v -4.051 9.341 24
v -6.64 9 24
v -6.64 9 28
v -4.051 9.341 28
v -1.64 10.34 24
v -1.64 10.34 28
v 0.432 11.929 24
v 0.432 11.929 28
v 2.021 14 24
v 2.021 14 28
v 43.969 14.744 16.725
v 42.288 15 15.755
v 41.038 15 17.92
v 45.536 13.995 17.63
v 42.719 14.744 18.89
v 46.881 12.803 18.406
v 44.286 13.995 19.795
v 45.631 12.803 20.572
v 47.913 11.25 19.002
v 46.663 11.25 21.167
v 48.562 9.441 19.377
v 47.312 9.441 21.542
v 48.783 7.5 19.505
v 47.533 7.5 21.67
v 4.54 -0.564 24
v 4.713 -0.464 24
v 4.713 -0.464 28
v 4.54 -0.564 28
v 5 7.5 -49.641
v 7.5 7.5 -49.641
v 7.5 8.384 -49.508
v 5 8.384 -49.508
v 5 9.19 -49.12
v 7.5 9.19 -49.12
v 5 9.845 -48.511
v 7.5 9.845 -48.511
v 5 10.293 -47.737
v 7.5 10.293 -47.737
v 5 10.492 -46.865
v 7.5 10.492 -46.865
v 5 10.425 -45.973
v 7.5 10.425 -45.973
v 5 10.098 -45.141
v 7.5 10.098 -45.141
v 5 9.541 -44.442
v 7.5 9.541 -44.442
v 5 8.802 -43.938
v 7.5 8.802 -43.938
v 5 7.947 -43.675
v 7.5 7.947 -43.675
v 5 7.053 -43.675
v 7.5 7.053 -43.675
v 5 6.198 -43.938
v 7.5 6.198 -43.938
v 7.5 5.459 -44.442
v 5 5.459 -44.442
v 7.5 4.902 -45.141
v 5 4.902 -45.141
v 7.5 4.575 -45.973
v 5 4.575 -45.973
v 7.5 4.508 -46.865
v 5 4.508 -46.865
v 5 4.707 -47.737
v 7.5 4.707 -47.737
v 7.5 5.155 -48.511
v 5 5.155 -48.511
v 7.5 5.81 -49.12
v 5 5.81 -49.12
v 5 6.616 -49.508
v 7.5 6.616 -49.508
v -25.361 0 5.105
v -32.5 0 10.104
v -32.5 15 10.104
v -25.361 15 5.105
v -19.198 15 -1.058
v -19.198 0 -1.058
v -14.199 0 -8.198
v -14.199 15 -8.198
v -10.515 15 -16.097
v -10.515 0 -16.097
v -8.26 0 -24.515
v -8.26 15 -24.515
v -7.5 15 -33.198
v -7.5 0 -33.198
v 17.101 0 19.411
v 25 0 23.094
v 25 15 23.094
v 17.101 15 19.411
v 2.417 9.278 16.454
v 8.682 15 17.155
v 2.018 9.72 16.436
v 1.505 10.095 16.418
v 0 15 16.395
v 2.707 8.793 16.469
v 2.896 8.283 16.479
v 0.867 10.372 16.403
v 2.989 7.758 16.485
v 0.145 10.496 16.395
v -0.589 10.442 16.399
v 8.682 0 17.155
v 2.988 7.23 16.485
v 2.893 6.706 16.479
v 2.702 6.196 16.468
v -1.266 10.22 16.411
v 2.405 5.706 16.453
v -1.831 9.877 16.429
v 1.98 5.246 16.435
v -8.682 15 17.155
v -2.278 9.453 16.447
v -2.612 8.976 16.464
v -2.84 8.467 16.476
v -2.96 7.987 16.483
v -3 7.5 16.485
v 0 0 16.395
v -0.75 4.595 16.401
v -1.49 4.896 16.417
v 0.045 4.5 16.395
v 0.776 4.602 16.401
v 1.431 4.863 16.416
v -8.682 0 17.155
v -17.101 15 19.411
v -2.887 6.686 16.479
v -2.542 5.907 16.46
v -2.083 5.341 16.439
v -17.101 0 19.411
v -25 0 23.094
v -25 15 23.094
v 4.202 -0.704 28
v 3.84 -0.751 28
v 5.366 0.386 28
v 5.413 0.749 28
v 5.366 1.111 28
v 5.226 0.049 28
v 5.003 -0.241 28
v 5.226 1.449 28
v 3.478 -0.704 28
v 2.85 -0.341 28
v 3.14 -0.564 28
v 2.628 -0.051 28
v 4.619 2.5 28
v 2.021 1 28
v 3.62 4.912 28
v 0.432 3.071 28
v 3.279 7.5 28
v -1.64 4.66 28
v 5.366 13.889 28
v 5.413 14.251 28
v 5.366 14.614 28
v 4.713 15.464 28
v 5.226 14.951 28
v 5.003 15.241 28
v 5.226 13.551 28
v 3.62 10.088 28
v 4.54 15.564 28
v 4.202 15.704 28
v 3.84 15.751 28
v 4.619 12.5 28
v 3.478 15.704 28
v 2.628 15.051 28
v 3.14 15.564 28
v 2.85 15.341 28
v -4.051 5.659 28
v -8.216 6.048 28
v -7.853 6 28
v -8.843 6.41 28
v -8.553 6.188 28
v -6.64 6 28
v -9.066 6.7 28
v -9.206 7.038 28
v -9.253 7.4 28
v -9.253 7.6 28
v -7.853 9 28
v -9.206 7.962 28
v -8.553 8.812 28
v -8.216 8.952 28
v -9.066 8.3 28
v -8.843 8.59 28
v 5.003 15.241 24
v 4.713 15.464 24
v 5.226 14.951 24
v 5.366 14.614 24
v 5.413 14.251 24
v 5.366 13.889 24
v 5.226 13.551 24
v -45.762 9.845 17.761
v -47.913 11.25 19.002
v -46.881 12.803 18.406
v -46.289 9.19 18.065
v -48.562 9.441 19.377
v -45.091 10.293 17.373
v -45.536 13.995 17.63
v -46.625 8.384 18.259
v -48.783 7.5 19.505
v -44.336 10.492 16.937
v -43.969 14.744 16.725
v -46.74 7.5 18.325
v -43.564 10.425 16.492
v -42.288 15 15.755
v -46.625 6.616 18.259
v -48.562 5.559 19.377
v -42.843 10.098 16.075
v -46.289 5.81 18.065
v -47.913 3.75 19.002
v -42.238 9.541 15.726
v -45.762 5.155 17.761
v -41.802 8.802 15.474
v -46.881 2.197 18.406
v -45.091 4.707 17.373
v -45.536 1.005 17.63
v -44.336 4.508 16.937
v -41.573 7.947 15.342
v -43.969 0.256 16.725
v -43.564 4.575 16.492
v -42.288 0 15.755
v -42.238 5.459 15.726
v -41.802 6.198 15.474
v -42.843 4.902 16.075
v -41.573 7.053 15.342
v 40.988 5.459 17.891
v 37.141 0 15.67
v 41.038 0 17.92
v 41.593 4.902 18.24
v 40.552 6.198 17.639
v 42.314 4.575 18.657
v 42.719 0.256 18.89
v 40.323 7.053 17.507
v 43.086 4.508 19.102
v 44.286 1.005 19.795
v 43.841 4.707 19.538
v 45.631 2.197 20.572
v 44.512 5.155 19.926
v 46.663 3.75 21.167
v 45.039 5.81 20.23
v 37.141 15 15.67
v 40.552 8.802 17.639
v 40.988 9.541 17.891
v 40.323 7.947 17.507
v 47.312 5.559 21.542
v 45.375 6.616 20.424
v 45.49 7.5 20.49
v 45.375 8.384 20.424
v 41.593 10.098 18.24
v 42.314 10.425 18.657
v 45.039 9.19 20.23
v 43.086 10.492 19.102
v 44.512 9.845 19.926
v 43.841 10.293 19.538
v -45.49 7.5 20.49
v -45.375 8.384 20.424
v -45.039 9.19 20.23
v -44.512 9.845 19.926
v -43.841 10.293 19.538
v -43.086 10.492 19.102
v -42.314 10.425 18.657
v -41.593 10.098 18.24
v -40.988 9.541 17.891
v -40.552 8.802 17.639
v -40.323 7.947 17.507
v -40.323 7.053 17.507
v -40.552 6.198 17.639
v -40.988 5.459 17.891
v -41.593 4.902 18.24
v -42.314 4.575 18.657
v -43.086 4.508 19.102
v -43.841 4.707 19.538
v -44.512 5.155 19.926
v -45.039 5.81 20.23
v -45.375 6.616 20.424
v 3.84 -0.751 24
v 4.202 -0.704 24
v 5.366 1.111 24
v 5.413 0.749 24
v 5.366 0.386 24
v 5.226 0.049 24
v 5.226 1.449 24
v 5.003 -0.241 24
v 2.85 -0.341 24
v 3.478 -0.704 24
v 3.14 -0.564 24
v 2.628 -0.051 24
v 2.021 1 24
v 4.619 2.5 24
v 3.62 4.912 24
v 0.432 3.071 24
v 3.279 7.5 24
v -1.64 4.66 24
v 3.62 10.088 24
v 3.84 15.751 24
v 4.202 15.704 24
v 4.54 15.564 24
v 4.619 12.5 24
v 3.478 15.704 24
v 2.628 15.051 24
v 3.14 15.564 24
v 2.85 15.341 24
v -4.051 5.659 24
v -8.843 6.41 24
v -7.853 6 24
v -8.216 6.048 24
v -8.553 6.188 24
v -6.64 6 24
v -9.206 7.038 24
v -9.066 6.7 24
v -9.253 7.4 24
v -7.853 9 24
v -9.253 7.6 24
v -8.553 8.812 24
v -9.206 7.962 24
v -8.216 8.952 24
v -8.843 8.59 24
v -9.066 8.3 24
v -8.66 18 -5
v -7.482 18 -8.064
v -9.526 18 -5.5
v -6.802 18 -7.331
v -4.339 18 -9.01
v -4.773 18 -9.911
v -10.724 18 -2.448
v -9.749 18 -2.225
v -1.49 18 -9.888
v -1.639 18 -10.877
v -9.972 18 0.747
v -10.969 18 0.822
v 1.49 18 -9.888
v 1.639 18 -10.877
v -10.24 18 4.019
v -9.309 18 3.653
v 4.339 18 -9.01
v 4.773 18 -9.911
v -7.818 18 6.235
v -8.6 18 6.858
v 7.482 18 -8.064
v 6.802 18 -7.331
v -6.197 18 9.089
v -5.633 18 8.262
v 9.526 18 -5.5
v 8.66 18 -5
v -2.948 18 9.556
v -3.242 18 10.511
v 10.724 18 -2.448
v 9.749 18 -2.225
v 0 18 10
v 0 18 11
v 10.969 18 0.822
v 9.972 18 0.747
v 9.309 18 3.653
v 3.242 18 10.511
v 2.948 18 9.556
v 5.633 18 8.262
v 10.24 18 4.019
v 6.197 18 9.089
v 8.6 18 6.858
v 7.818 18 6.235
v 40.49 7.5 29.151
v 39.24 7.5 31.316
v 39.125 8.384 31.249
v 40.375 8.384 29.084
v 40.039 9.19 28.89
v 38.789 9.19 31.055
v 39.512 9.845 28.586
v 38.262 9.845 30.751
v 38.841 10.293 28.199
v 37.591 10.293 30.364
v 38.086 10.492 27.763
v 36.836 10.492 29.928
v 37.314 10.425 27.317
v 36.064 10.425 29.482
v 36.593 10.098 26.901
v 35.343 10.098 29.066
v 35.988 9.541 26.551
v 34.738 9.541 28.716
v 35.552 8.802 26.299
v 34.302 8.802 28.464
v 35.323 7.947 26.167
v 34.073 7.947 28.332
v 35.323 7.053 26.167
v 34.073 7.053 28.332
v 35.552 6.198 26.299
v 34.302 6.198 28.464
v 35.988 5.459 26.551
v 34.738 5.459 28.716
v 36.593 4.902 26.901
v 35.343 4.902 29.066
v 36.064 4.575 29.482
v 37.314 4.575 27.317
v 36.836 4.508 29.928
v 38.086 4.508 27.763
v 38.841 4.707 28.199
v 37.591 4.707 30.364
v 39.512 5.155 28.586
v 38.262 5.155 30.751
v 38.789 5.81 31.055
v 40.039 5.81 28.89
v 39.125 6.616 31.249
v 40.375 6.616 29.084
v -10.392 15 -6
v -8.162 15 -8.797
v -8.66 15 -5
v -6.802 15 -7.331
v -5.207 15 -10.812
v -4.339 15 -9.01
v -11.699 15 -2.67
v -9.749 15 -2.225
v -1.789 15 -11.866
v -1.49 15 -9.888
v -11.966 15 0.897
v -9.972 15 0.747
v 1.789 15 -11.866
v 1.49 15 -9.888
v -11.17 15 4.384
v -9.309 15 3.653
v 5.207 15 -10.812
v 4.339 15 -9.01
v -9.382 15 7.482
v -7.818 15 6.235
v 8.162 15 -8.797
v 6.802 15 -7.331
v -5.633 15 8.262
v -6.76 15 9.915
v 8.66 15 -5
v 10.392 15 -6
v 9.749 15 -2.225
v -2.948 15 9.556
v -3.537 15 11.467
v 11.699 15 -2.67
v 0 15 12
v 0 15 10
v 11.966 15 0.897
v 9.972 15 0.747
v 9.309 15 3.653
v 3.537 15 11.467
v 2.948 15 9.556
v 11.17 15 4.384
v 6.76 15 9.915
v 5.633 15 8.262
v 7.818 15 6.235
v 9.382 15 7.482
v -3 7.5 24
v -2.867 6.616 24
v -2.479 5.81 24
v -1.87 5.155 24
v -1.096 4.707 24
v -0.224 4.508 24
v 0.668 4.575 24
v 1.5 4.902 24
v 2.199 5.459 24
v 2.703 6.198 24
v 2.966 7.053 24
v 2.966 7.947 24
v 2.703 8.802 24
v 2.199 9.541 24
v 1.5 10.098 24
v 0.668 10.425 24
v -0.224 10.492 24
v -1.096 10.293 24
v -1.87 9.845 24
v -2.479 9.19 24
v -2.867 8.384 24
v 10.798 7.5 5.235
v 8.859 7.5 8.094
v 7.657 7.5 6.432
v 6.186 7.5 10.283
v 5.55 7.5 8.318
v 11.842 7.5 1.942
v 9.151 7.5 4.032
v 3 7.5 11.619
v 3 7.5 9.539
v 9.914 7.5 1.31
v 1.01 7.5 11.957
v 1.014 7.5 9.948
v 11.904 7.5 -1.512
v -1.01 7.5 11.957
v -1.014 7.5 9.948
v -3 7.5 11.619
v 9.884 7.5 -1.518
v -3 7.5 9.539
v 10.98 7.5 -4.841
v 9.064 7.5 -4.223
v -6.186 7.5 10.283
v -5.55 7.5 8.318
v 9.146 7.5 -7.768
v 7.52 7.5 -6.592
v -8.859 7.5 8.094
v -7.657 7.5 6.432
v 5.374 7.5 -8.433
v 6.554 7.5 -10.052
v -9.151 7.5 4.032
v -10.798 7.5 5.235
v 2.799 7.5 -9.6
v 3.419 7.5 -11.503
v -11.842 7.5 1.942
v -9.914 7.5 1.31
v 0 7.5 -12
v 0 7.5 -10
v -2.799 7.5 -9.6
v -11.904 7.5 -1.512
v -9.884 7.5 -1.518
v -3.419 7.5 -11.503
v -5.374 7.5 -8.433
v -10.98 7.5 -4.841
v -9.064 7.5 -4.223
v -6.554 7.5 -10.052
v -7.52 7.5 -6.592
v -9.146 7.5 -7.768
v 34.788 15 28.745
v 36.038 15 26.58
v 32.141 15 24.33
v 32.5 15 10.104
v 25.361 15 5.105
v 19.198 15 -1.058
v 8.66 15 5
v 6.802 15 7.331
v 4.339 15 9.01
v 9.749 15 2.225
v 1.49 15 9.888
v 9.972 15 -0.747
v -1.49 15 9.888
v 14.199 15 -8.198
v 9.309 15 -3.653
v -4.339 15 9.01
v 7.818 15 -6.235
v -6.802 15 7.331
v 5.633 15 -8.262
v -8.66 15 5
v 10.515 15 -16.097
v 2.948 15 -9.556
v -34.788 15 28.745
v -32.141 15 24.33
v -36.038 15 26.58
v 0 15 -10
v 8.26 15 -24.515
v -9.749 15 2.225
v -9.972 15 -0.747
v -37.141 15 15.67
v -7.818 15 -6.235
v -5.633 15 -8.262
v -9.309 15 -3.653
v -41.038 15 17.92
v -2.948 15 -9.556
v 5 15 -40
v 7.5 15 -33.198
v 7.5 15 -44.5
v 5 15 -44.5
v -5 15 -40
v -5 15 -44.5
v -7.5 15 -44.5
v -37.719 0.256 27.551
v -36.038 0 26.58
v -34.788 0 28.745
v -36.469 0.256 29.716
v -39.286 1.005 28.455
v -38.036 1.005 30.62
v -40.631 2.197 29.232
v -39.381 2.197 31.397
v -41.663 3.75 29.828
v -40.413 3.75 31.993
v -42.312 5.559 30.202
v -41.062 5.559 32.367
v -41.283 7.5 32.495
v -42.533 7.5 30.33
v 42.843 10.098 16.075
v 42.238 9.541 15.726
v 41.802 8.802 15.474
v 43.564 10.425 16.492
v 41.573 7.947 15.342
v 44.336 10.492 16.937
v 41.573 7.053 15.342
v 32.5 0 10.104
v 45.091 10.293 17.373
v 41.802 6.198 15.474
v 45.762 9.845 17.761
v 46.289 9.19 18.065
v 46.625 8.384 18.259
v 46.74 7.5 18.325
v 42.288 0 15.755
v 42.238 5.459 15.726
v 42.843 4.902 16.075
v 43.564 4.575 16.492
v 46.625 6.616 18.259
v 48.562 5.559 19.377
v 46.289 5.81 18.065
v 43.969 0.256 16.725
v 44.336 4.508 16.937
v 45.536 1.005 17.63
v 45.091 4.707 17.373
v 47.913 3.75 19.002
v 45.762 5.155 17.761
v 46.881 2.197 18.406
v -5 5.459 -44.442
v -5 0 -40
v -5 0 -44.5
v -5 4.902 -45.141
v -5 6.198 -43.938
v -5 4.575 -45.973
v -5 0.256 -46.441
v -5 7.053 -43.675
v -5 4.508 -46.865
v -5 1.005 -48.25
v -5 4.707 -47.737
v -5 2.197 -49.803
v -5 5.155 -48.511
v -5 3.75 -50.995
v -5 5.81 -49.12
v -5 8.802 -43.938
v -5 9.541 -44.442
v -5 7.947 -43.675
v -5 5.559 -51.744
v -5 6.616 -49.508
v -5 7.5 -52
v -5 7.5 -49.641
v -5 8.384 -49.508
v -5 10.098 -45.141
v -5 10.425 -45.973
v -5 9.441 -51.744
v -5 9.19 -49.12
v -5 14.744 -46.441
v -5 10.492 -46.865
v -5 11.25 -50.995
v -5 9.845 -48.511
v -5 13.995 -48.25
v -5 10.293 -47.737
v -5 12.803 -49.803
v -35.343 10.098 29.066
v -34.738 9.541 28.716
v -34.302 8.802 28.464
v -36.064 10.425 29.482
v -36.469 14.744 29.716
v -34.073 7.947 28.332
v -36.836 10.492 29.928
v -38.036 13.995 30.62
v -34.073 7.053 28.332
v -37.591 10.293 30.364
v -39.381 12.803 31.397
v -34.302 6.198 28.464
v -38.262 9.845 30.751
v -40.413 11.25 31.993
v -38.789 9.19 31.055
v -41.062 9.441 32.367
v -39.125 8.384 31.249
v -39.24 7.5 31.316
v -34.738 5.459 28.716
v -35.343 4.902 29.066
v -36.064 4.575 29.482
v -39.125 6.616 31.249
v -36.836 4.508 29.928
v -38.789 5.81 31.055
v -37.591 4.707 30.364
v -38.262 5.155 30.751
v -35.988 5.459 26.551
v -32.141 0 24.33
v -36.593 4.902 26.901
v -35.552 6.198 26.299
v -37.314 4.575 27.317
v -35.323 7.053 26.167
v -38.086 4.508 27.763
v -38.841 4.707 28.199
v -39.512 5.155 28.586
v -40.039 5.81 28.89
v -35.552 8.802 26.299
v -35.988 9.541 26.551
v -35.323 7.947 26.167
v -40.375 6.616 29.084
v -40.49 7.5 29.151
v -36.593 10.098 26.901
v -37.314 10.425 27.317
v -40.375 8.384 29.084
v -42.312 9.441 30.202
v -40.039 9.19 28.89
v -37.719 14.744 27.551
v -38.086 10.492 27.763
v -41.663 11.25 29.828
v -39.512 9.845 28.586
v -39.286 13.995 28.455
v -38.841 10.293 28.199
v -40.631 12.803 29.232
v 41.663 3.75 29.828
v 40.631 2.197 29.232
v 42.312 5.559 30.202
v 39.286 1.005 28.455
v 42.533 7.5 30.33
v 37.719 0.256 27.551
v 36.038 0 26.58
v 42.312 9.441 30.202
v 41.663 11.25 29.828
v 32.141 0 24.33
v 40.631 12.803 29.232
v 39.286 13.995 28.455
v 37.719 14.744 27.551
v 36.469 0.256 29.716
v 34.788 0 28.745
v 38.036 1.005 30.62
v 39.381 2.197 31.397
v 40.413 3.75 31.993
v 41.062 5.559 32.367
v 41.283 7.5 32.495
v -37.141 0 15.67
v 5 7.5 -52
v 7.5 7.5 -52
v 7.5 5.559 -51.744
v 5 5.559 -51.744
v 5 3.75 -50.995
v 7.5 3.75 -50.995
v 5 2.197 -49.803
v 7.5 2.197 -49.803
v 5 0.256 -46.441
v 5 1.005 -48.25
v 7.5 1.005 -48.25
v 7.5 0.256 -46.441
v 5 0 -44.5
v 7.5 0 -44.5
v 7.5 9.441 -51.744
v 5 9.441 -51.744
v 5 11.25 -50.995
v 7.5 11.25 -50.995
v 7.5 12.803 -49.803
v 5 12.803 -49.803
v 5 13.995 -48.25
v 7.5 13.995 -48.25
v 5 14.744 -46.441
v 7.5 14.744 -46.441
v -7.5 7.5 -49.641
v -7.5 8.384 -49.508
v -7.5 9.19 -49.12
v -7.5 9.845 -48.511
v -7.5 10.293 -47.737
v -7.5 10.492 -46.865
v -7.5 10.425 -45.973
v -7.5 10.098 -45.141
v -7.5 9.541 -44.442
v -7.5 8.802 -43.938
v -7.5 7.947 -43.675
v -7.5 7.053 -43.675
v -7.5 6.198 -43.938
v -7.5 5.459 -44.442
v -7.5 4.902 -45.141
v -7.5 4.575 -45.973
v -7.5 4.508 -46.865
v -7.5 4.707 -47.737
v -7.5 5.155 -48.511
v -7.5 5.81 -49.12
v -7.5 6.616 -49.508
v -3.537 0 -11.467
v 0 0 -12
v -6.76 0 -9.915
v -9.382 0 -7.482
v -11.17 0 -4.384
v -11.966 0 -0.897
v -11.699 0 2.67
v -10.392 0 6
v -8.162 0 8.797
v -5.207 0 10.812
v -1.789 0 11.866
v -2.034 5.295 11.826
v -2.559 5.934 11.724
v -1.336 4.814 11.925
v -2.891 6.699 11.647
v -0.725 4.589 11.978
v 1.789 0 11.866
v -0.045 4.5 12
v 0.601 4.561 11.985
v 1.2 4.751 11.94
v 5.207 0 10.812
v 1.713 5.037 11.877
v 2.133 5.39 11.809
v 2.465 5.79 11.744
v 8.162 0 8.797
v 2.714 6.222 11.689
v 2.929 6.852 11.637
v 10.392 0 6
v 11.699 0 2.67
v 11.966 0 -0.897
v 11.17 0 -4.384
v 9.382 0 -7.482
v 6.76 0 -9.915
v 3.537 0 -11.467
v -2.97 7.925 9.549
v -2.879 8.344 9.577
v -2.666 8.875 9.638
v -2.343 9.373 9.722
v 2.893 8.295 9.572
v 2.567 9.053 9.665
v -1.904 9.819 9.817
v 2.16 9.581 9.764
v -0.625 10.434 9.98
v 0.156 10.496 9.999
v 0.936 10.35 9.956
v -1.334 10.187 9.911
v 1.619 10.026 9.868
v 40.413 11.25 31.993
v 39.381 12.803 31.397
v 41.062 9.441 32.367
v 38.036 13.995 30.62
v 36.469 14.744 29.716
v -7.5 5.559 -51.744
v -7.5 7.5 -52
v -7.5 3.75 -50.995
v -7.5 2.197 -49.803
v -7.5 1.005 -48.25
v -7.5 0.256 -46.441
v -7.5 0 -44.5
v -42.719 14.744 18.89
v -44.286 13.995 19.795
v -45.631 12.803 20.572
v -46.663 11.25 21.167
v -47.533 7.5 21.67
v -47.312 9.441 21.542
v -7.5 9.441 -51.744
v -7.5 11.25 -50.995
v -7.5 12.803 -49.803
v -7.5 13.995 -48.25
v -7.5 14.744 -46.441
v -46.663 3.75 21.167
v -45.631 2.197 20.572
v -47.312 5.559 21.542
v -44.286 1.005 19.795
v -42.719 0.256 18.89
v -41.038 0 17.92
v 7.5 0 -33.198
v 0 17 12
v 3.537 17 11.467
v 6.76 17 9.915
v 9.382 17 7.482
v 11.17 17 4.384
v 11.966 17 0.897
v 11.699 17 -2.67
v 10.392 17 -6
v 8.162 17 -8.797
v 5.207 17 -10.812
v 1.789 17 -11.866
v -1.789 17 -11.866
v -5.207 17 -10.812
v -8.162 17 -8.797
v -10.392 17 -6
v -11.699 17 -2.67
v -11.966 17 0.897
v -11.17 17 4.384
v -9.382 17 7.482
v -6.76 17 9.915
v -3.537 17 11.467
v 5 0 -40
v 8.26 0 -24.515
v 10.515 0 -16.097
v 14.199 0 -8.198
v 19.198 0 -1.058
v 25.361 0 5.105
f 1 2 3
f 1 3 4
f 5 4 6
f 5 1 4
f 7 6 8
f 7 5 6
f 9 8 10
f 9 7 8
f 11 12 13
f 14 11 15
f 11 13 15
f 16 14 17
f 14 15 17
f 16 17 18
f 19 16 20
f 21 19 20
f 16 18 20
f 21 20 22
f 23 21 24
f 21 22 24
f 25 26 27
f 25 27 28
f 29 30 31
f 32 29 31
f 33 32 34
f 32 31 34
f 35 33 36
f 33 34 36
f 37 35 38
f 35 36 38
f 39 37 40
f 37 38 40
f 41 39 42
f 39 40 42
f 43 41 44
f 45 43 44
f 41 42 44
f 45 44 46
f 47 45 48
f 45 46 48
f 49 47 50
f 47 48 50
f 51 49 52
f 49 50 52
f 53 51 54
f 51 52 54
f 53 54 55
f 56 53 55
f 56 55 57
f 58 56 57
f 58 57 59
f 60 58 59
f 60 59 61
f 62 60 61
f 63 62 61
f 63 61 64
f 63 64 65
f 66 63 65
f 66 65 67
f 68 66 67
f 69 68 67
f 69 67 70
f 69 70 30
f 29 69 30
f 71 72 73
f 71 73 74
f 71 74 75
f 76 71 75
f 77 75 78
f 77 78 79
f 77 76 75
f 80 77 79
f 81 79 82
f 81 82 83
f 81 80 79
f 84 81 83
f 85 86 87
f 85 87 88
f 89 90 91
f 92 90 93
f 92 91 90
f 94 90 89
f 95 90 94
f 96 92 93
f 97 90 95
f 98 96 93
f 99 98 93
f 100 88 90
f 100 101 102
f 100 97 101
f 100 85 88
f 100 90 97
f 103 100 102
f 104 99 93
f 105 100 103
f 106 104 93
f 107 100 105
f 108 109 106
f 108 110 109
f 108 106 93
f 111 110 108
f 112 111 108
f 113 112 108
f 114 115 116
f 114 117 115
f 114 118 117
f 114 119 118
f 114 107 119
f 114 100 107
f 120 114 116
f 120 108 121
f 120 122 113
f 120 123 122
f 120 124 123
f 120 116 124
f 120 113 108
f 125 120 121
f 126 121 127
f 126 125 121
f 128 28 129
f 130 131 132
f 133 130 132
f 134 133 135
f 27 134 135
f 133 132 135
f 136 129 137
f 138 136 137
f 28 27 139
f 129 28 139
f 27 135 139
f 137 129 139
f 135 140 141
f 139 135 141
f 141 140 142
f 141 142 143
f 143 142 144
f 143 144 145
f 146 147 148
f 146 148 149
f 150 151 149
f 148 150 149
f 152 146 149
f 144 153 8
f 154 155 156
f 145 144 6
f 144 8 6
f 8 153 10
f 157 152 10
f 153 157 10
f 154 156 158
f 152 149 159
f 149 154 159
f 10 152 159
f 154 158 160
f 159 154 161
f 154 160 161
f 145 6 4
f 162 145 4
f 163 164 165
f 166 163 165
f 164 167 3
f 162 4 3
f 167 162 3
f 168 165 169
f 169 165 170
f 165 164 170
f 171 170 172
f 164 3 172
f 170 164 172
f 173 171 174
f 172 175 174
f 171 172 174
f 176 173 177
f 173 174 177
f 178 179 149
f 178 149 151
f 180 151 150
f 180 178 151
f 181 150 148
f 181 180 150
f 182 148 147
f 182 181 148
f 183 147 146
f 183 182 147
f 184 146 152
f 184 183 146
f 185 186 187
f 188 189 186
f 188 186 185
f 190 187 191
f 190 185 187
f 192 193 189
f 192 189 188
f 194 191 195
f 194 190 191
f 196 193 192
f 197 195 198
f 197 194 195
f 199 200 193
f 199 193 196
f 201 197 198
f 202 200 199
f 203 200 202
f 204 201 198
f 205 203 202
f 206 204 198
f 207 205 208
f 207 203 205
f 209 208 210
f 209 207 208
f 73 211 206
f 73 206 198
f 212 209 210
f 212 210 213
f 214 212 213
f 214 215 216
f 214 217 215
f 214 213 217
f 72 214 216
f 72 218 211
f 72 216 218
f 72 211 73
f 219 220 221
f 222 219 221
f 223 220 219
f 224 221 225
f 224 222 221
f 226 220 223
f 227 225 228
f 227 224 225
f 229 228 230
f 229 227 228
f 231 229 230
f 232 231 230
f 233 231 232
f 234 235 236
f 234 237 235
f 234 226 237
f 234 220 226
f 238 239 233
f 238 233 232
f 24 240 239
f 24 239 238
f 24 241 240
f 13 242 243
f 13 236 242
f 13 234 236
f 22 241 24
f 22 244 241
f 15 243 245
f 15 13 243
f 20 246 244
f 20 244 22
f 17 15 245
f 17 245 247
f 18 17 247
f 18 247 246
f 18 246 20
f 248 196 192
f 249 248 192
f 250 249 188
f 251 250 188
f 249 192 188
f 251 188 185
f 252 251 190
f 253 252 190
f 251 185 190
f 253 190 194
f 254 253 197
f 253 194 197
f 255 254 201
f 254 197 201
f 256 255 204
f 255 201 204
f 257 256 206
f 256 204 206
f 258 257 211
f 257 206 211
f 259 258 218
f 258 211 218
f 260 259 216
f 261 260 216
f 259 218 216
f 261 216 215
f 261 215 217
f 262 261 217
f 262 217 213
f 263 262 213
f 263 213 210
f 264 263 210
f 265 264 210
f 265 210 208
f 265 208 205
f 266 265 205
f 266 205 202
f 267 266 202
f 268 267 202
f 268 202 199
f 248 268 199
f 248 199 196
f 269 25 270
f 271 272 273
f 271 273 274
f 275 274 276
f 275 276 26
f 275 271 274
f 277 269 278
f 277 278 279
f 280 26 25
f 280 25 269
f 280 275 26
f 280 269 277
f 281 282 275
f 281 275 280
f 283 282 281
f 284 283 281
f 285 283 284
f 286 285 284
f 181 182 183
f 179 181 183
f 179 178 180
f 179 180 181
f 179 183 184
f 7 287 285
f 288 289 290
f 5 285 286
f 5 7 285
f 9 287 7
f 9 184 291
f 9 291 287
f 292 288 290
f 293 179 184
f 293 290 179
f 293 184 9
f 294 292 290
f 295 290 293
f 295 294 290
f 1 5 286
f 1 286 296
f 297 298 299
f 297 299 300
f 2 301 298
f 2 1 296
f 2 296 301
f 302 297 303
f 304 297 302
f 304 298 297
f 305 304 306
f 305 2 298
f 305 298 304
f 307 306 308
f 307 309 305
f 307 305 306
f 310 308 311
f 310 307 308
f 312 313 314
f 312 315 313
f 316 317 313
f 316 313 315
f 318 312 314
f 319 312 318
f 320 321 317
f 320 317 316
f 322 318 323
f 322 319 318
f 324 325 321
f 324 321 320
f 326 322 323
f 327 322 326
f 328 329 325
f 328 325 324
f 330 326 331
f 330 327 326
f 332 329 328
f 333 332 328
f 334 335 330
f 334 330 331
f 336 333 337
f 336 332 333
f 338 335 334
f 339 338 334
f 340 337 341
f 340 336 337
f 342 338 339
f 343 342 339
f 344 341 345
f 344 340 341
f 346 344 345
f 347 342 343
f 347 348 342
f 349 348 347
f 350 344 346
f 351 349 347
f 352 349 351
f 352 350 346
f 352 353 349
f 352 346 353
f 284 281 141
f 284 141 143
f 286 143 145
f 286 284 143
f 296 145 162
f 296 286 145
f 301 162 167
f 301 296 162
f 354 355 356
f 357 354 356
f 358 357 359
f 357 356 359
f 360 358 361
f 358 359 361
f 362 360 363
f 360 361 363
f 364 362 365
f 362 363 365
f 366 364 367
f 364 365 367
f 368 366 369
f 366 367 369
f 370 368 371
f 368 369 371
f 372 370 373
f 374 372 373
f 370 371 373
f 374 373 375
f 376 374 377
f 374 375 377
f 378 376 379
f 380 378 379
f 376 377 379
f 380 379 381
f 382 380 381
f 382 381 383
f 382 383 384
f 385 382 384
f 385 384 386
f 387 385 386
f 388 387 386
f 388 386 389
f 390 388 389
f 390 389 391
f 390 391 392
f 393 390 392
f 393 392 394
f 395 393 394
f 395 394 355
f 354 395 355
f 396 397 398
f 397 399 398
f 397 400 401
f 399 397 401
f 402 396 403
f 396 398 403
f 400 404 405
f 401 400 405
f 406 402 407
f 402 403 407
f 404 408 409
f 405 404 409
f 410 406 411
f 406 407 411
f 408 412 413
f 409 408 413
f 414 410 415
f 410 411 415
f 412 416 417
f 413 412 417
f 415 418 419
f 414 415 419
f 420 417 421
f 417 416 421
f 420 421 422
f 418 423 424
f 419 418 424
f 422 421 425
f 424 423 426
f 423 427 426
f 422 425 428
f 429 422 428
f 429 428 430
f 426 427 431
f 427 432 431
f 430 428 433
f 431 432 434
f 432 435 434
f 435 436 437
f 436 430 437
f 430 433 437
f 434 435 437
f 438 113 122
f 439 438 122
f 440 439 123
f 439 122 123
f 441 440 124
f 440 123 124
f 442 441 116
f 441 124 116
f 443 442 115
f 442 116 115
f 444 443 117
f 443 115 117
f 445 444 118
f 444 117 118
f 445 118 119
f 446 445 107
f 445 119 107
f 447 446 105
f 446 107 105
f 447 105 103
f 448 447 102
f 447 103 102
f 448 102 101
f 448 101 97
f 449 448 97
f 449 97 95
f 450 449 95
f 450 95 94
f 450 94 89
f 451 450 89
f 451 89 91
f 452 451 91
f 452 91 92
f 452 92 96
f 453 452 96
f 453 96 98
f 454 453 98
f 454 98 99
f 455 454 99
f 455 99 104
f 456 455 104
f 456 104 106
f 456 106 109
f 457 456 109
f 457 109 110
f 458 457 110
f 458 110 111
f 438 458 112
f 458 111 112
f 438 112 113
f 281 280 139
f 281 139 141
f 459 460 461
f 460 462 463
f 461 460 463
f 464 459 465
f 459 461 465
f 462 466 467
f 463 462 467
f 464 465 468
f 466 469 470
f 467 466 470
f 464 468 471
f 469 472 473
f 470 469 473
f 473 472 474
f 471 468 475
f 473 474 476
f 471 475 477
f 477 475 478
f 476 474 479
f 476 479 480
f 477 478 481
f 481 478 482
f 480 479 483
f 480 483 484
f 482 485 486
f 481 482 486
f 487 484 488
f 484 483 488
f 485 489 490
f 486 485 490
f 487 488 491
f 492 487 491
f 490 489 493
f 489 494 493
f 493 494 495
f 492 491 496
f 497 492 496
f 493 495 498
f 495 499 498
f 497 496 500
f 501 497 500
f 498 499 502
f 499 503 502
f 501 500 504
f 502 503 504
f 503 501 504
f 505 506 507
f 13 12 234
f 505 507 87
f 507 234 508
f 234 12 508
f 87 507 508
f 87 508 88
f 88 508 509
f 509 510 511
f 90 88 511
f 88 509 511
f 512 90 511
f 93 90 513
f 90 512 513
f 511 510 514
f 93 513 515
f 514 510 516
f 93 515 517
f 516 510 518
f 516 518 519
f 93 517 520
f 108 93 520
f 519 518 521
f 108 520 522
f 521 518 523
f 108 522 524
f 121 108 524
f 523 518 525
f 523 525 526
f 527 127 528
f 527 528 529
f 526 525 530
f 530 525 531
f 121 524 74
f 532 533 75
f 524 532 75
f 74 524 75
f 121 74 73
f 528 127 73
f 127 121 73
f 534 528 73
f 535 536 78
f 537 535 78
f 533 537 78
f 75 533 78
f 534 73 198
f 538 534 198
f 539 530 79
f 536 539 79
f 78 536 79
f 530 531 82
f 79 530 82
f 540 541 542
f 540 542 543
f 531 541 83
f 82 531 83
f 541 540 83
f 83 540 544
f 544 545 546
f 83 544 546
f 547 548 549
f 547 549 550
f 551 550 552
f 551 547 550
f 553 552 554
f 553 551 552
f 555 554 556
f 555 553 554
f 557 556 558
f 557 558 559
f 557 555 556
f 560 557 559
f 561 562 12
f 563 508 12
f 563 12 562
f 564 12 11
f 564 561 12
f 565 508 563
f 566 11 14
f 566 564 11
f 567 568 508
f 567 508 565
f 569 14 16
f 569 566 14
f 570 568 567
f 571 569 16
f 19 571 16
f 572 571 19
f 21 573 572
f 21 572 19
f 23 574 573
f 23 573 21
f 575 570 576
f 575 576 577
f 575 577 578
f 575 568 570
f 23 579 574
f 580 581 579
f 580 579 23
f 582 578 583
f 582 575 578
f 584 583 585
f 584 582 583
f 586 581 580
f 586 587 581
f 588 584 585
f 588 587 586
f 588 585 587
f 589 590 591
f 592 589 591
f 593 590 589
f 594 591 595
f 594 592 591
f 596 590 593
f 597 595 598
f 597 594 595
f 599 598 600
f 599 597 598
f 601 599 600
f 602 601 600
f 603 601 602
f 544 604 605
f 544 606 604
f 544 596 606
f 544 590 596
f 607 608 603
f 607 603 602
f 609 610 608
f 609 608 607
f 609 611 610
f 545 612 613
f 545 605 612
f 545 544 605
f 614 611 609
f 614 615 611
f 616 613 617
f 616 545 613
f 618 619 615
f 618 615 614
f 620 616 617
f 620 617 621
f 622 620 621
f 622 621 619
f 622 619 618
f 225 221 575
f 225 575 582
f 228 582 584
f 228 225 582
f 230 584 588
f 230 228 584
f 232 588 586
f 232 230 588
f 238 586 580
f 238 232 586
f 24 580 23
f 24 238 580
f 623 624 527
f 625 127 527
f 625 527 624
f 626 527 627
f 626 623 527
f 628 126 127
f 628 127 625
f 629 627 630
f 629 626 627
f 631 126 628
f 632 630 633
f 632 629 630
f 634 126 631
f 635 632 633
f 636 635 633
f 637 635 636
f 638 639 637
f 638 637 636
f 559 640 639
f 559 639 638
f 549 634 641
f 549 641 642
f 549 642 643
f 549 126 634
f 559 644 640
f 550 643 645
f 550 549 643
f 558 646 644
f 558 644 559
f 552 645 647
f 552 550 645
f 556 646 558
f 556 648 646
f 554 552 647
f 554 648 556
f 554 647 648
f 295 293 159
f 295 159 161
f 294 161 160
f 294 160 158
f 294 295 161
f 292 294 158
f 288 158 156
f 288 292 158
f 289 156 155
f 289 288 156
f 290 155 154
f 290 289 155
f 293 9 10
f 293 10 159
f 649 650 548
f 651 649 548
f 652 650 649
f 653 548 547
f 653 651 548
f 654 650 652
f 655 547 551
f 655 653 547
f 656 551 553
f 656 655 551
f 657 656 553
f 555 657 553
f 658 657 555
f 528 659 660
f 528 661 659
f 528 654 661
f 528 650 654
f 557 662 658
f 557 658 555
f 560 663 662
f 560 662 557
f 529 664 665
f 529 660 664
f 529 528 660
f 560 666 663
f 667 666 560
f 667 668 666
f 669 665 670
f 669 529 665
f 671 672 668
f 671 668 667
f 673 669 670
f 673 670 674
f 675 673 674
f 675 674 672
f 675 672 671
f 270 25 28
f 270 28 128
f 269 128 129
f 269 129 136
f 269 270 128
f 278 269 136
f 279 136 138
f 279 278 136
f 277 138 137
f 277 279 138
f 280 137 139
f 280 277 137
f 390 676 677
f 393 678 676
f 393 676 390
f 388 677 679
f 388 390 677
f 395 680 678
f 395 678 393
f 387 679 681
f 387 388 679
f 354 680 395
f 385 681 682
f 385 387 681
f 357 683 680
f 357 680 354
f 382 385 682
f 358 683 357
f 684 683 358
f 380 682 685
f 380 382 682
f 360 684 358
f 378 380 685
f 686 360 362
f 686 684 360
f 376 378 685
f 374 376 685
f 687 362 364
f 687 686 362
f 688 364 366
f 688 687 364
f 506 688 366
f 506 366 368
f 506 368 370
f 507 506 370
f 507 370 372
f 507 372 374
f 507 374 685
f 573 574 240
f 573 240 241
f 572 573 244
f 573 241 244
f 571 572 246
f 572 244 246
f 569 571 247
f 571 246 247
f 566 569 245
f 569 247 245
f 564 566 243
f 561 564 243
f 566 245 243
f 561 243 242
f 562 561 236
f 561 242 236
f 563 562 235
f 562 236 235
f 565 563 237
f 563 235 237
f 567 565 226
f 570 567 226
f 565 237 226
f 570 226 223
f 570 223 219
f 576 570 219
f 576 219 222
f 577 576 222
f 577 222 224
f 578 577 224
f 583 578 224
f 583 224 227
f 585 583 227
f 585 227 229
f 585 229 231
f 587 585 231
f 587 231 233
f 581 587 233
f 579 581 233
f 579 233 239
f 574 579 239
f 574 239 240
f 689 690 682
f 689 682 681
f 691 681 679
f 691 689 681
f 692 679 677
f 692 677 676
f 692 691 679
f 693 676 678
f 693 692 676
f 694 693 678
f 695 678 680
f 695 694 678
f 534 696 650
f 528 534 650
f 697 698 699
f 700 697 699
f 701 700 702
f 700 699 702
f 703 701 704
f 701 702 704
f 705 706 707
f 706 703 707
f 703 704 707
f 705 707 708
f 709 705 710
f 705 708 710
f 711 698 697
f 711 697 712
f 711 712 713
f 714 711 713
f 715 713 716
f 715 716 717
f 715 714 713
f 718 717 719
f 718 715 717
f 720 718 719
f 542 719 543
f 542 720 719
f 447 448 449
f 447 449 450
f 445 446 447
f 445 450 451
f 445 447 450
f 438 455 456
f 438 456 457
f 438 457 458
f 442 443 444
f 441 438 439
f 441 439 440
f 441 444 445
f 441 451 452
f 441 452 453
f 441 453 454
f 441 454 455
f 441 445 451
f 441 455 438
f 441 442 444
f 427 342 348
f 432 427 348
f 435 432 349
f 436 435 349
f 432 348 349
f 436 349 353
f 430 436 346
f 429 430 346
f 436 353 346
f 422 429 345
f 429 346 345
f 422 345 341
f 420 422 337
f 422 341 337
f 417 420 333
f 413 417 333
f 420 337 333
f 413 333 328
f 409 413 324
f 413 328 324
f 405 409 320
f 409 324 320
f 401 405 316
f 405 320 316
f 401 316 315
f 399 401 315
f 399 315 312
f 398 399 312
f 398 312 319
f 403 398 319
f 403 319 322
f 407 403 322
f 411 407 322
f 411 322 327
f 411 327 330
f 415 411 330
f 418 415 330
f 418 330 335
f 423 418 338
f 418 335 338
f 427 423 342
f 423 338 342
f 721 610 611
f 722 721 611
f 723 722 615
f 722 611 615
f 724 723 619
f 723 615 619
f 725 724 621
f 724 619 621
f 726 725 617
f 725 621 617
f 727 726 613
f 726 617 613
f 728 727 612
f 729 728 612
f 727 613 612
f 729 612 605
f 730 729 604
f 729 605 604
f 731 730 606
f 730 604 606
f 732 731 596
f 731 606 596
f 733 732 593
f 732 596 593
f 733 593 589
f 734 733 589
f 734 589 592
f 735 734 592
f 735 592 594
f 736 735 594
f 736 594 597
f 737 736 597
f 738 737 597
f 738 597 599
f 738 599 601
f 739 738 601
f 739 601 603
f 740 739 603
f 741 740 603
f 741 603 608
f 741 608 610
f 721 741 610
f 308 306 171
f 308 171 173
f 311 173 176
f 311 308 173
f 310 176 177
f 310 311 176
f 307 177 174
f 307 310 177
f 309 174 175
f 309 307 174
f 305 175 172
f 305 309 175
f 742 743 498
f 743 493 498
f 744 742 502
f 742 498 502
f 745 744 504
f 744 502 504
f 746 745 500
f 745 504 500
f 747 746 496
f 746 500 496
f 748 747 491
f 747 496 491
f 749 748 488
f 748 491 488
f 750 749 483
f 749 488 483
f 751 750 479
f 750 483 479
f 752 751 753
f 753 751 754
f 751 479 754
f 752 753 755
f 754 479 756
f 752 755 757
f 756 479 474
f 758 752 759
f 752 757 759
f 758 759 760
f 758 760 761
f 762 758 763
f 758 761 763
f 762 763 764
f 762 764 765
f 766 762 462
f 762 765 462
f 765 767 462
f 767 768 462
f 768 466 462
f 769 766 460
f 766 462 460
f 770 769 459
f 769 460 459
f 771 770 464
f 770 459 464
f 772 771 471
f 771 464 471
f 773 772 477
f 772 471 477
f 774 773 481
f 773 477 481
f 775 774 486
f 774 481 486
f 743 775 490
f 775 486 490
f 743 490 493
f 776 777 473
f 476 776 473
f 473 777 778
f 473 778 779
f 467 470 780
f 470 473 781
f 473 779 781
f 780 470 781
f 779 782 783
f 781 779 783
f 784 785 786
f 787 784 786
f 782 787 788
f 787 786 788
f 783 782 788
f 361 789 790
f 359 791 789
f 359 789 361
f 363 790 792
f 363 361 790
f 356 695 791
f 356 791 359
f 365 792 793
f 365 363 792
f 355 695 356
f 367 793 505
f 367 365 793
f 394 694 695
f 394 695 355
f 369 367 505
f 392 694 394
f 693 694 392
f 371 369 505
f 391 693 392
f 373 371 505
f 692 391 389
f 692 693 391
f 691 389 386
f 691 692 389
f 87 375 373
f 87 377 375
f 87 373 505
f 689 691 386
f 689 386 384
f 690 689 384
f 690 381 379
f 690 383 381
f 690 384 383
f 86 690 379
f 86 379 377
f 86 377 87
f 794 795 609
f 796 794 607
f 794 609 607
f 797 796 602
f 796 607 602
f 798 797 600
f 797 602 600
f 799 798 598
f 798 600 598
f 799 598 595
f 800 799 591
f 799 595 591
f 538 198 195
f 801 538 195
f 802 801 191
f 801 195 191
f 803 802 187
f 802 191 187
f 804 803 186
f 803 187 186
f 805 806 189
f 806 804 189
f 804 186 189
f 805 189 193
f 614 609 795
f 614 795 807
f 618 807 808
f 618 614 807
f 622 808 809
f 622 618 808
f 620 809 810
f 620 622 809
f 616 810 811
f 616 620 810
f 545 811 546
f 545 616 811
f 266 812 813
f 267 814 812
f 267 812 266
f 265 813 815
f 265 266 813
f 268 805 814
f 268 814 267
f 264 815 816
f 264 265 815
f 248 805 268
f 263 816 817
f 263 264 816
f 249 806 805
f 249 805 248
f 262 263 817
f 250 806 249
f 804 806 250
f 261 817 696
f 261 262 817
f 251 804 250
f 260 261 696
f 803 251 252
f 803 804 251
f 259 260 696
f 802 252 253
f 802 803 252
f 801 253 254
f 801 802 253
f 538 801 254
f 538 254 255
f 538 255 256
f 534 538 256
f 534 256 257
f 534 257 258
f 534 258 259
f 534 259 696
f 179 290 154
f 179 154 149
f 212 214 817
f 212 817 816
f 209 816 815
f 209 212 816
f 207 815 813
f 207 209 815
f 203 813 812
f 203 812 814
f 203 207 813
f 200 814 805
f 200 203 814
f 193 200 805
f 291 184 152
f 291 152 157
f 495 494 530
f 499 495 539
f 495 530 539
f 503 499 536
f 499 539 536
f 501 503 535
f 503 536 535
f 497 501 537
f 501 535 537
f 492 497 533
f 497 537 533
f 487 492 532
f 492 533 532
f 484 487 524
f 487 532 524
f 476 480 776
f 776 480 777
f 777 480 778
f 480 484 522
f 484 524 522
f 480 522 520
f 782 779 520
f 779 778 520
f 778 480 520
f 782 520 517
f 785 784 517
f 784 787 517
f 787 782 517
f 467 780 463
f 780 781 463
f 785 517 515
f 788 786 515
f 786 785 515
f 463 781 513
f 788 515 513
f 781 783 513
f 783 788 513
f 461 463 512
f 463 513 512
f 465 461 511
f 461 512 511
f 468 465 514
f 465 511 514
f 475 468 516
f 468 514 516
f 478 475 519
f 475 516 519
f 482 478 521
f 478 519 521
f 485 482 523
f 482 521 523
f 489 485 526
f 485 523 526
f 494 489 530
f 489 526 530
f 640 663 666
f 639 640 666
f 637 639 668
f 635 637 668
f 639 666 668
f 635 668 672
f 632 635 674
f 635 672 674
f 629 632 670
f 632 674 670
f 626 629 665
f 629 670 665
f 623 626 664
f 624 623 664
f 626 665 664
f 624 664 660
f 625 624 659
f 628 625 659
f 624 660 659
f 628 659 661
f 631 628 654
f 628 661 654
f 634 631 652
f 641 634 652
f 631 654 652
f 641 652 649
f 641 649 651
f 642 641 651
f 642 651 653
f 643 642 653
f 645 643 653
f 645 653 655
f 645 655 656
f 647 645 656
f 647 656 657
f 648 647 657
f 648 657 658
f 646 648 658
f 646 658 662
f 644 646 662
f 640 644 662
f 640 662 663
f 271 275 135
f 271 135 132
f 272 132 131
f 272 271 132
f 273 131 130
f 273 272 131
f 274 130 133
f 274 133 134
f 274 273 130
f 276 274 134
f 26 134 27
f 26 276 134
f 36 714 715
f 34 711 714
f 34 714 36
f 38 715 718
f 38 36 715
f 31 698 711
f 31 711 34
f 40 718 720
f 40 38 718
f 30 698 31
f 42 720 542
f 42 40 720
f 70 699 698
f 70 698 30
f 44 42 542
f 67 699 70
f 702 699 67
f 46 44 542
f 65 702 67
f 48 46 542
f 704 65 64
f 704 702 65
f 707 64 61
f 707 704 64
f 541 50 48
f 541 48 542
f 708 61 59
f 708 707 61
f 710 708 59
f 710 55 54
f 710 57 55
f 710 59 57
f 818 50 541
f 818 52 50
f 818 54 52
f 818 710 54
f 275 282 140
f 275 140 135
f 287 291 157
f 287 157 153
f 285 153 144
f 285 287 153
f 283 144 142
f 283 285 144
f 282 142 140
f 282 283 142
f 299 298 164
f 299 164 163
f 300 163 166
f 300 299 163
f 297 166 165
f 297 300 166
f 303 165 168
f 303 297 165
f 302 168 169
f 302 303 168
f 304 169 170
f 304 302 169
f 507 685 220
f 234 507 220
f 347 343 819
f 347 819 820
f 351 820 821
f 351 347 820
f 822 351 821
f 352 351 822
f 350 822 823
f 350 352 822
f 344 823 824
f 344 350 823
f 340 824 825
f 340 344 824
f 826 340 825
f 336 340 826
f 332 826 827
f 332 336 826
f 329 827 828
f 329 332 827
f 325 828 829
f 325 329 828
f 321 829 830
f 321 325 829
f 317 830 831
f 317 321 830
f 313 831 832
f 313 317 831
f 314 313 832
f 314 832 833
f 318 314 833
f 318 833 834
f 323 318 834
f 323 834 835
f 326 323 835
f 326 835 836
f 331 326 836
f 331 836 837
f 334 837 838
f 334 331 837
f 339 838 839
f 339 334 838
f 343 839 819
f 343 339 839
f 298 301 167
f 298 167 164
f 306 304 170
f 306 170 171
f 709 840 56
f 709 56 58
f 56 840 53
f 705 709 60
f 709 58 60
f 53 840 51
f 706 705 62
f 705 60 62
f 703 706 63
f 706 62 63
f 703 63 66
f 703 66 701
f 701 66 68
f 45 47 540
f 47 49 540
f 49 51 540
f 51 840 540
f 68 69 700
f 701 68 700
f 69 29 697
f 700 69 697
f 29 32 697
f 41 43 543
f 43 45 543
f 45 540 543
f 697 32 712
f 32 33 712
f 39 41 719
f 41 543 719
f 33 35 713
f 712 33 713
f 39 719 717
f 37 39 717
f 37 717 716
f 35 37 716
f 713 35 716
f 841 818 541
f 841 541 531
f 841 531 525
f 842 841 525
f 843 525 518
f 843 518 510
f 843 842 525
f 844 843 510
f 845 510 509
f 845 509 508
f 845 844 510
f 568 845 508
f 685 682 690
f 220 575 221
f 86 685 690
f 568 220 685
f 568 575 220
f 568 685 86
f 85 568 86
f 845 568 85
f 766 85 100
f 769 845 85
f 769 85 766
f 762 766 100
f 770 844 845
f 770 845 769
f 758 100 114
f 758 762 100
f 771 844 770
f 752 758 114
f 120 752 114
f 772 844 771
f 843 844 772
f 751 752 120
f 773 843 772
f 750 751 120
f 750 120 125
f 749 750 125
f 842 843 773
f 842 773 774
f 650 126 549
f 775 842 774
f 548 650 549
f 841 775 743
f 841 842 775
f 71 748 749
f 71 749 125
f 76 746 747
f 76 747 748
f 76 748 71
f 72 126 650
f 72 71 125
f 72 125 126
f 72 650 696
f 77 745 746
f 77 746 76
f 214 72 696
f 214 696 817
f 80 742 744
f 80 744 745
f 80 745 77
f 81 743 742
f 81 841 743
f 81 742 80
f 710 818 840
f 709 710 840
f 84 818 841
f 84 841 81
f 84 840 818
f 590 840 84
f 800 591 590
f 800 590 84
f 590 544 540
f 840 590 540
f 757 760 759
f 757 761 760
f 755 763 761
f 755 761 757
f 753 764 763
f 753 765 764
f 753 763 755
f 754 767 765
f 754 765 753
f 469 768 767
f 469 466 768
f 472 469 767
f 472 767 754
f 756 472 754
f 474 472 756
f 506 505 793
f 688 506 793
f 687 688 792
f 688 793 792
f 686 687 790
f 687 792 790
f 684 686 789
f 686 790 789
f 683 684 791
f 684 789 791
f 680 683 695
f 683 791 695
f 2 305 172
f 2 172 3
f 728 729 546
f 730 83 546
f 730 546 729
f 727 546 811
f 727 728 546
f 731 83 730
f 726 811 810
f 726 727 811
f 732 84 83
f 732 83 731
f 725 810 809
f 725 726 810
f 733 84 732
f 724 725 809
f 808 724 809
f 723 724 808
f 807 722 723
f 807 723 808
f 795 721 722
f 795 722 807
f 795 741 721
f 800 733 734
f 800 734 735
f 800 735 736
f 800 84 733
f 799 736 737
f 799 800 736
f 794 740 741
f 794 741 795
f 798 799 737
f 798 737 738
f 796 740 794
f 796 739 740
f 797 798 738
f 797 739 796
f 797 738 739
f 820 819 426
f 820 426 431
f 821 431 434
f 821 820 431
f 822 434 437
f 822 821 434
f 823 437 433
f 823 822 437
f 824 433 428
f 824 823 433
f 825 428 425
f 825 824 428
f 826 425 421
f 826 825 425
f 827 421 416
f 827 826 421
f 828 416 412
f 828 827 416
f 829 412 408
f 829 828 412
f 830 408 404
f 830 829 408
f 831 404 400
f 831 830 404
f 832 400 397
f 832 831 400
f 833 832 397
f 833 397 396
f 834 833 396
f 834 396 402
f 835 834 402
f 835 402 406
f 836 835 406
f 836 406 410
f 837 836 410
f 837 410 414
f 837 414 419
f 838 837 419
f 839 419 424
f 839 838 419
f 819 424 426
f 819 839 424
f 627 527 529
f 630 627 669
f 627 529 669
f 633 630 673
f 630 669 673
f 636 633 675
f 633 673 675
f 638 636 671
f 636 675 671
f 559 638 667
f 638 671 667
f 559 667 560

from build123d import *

# Parameters (mm, degrees)
BOSS_EXTRU_1_START           = -15
ESQUISSE2_R                  = 15
BOSS_EXTRU_1_DEPTH           = 15
CONG_1_R                     = 7.5
ENL_V_MAT_EXTRU_1_REACH      = 74.862
ESQUISSE3_W                  = 10
ESQUISSE3_H                  = 42.147578144
ESQUISSE4_R                  = 3
ENL_V_MAT_EXTRU_2_DEPTH      = 79.082086437
R_P_TITION_CIRCULAIRE5_COUNT = 3
ESQUISSE5_R                  = 3
BOSS_EXTRU_2_DEPTH           = 24
ESQUISSE6_R                  = 10
ENL_V_MAT_EXTRU_3_DEPTH      = 24
ENL_V_START                  = -7.5
ESQUISSE7_R                  = 12
ENL_V_MAT_EXTRU_5_DEPTH      = 7.5
BOSS_EXTRU_3_DEPTH           = 4
BOSS_EXTRU_5_START           = 3
ESQUISSE10_R                 = 12
ESQUISSE10_R_2               = 10
BOSS_EXTRU_5_DEPTH           = 3
CHANFREIN1_SIZE              = 1


with BuildPart() as part:
    # Esquisse1 → Révolution1 (revolve)
    with BuildSketch(Plane.XY, mode=Mode.PRIVATE) as r_volution1_sk:
        Polygon((-12, 0), (-12, 7.5), (-10, 7.5), (-10, 15), (-15, 15), (-15, 0), align=None)
    revolve(r_volution1_sk.sketch.rotate(Axis((0, 0, 0), (0, 1, 0)), 270), axis=Axis((0, 0, 0), (0, 1, 0)))

    # Esquisse2 → Boss.-Extru.1 (add)
    with BuildSketch(Plane(origin=(0, 15, 0), x_dir=(1, 0, 0), z_dir=(0, 1, 0)).offset(BOSS_EXTRU_1_START)):
        with BuildLine():
            Line((-7.5, 33.197640478), (-7.5, 52))
            Line((-7.5, 52), (7.5, 52))
            Line((7.5, 52), (7.5, 33.197640478))
            ThreePointArc((7.5, 33.197640478), (14.198729811, 8.197640478), (32.5, -10.103629711))
            Line((32.5, -10.103629711), (48.783320997, -19.504809472))
            Line((48.783320997, -19.504809472), (41.283320997, -32.495190528))
            Line((41.283320997, -32.495190528), (25, -23.094010768))
            ThreePointArc((25, -23.094010768), (0, -16.395280957), (-25, -23.094010768))
            Line((-25, -23.094010768), (-41.283320997, -32.495190528))
            Line((-41.283320997, -32.495190528), (-48.783320997, -19.504809472))
            Line((-48.783320997, -19.504809472), (-32.5, -10.103629711))
            ThreePointArc((-32.5, -10.103629711), (-14.198729811, 8.197640478), (-7.5, 33.197640478))
        make_face()
        Circle(ESQUISSE2_R, mode=Mode.SUBTRACT)
    extrude(amount=BOSS_EXTRU_1_DEPTH)

    # Congé1
    cong_1_edges = [part.edges().sort_by_distance(p)[0] for p in [
        (0, 0, -52),
        (0, 15, -52),
        (45.033320997, 0, 26),
        (45.033320997, 15, 26),
        (-45.033320997, 0, 26),
        (-45.033320997, 15, 26),
    ]]
    fillet(cong_1_edges, radius=CONG_1_R - 0.0001)  # a hair under: the kernel refuses the full size

    # Esquisse3 → Enlèv. mat.-Extru.1 (cut, up to next)
    with BuildSketch(Plane(origin=(0, 15, 0), x_dir=(1, 0, 0), z_dir=(0, 1, 0)), mode=Mode.PRIVATE) as enl_v_mat_extru_1_sk1:
        with Locations((0, 61.073789072)):
            Rectangle(ESQUISSE3_W, ESQUISSE3_H)
    enl_v_mat_extru_1_tool1 = extrude(enl_v_mat_extru_1_sk1.sketch, amount=-ENL_V_MAT_EXTRU_1_REACH, mode=Mode.PRIVATE) & part.part
    # Esquisse3 → Enlèv. mat.-Extru.1 (cut, up to next)
    with BuildSketch(Plane(origin=(0, 15, 0), x_dir=(1, 0, 0), z_dir=(0, 1, 0)), mode=Mode.PRIVATE) as enl_v_mat_extru_1_sk2:
        Polygon((32.141016151, -24.330127019), (37.141016151, -15.669872981), (73.641889532, -36.743662053), (68.641889532, -45.403916091), align=None)
    enl_v_mat_extru_1_tool2 = extrude(enl_v_mat_extru_1_sk2.sketch, amount=-ENL_V_MAT_EXTRU_1_REACH, mode=Mode.PRIVATE) & part.part
    # Esquisse3 → Enlèv. mat.-Extru.1 (cut, up to next)
    with BuildSketch(Plane(origin=(0, 15, 0), x_dir=(1, 0, 0), z_dir=(0, 1, 0)), mode=Mode.PRIVATE) as enl_v_mat_extru_1_sk3:
        Polygon((-37.141016151, -15.669872981), (-32.141016151, -24.330127019), (-68.641889532, -45.403916091), (-73.641889532, -36.743662053), align=None)
    enl_v_mat_extru_1_tool3 = extrude(enl_v_mat_extru_1_sk3.sketch, amount=-ENL_V_MAT_EXTRU_1_REACH, mode=Mode.PRIVATE) & part.part
    add(enl_v_mat_extru_1_tool1.solids().sort_by_distance((0, 15, -61.073789))[0], mode=Mode.SUBTRACT)
    add(enl_v_mat_extru_1_tool2.solids().sort_by_distance((52.891453, 15, 30.536895))[0], mode=Mode.SUBTRACT)
    add(enl_v_mat_extru_1_tool3.solids().sort_by_distance((-52.891453, 15, 30.536895))[0], mode=Mode.SUBTRACT)

    # Esquisse4 → Enlèv. mat.-Extru.2 (cut, through all)
    with BuildSketch(Plane(origin=(7.5, 0, 0), x_dir=(0, 0, -1), z_dir=(1, 0, 0))):
        with Locations((46.641012263, 7.5)):
            Circle(ESQUISSE4_R)
    enl_v_mat_extru_2 = extrude(amount=-ENL_V_MAT_EXTRU_2_DEPTH, mode=Mode.SUBTRACT)

    # Répétition circulaire5: Enlèv. mat.-Extru.2 ×3 about axis
    r_p_tition_circulaire5_axis = Axis((0, 0, 0), (0, 1, 0))
    for i in range(1, R_P_TITION_CIRCULAIRE5_COUNT):
        add(enl_v_mat_extru_2.rotate(r_p_tition_circulaire5_axis, i * 360 / R_P_TITION_CIRCULAIRE5_COUNT), mode=Mode.SUBTRACT)

    # Esquisse5 → Boss.-Extru.2 (add)
    with BuildSketch(Plane.XY):
        with Locations(Location((0, 7.5, 0), (0, 0, 180))):
            Circle(ESQUISSE5_R)
    extrude(amount=BOSS_EXTRU_2_DEPTH)

    # Esquisse6 → Enlèv. mat.-Extru.3 (cut)
    with BuildSketch(Plane(origin=(0, 15, 0), x_dir=(1, 0, 0), z_dir=(0, 1, 0))):
        with Locations(Location((0, 0, 0), (0, 0, 90))):
            Circle(ESQUISSE6_R)
    extrude(amount=-ENL_V_MAT_EXTRU_3_DEPTH, mode=Mode.SUBTRACT)

    # Esquisse7 → Enlèv. mat.-Extru.5 (cut)
    with BuildSketch(Plane.XZ.offset(ENL_V_START)):
        with Locations(Location((0, 0, 0), (0, 0, 270))):
            Circle(ESQUISSE7_R)
    extrude(amount=ENL_V_MAT_EXTRU_5_DEPTH, mode=Mode.SUBTRACT)


with BuildPart() as body_2:
    # Esquisse8 → Boss.-Extru.3 (new body)
    with BuildSketch(Plane.XY.offset(24)):
        with BuildLine():
            Line((-6.639528096, 6), (-7.853404144, 6))
            ThreePointArc((-7.853404144, 6), (-8.843353638, 6.410050506), (-9.253404144, 7.4))
            Line((-9.253404144, 7.4), (-9.253404144, 7.6))
            ThreePointArc((-9.253404144, 7.6), (-8.843353638, 8.589949494), (-7.853404144, 9))
            Line((-7.853404144, 9), (-6.639528096, 9))
            ThreePointArc((-6.639528096, 9), (-1.639528096, 10.339745962), (2.020725942, 14))
            Line((2.020725942, 14), (2.627663966, 15.051247495))
            ThreePointArc((2.627663966, 15.051247495), (3.477752868, 15.703543652), (4.540099532, 15.56368306))
            Line((4.540099532, 15.56368306), (4.713304612, 15.46368306))
            ThreePointArc((4.713304612, 15.46368306), (5.365600769, 14.613594158), (5.225740178, 13.551247495))
            Line((5.225740178, 13.551247495), (4.618802154, 12.5))
            ThreePointArc((4.618802154, 12.5), (3.279056191, 7.5), (4.618802154, 2.5))
            Line((4.618802154, 2.5), (5.225740178, 1.448752505))
            ThreePointArc((5.225740178, 1.448752505), (5.365600769, 0.386405842), (4.713304612, -0.46368306))
            Line((4.713304612, -0.46368306), (4.540099532, -0.56368306))
            ThreePointArc((4.540099532, -0.56368306), (3.477752868, -0.703543652), (2.627663966, -0.051247495))
            Line((2.627663966, -0.051247495), (2.020725942, 1))
            ThreePointArc((2.020725942, 1), (-1.639528096, 4.660254038), (-6.639528096, 6))
        make_face()
    extrude(amount=BOSS_EXTRU_3_DEPTH)


with BuildPart() as body_3:
    # Esquisse10 → Boss.-Extru.5 (new body)
    with BuildSketch(Plane(origin=(0, 15, 0), x_dir=(1, 0, 0), z_dir=(0, 1, 0)).offset(BOSS_EXTRU_5_START)):
        with Locations(Location((0, 0, 0), (0, 0, 270))):
            Circle(ESQUISSE10_R)
        with Locations(Location((0, 0, 0), (0, 0, 270))):
            Circle(ESQUISSE10_R_2, mode=Mode.SUBTRACT)
    extrude(amount=-BOSS_EXTRU_5_DEPTH)

    # Chanfrein1
    chanfrein1_edges = [body_3.edges().sort_by_distance(p)[0] for p in [
        (0, 18, -12),
    ]]
    chamfer(chanfrein1_edges, length=CHANFREIN1_SIZE)


solid = Compound([part.part, body_2.part, body_3.part])
